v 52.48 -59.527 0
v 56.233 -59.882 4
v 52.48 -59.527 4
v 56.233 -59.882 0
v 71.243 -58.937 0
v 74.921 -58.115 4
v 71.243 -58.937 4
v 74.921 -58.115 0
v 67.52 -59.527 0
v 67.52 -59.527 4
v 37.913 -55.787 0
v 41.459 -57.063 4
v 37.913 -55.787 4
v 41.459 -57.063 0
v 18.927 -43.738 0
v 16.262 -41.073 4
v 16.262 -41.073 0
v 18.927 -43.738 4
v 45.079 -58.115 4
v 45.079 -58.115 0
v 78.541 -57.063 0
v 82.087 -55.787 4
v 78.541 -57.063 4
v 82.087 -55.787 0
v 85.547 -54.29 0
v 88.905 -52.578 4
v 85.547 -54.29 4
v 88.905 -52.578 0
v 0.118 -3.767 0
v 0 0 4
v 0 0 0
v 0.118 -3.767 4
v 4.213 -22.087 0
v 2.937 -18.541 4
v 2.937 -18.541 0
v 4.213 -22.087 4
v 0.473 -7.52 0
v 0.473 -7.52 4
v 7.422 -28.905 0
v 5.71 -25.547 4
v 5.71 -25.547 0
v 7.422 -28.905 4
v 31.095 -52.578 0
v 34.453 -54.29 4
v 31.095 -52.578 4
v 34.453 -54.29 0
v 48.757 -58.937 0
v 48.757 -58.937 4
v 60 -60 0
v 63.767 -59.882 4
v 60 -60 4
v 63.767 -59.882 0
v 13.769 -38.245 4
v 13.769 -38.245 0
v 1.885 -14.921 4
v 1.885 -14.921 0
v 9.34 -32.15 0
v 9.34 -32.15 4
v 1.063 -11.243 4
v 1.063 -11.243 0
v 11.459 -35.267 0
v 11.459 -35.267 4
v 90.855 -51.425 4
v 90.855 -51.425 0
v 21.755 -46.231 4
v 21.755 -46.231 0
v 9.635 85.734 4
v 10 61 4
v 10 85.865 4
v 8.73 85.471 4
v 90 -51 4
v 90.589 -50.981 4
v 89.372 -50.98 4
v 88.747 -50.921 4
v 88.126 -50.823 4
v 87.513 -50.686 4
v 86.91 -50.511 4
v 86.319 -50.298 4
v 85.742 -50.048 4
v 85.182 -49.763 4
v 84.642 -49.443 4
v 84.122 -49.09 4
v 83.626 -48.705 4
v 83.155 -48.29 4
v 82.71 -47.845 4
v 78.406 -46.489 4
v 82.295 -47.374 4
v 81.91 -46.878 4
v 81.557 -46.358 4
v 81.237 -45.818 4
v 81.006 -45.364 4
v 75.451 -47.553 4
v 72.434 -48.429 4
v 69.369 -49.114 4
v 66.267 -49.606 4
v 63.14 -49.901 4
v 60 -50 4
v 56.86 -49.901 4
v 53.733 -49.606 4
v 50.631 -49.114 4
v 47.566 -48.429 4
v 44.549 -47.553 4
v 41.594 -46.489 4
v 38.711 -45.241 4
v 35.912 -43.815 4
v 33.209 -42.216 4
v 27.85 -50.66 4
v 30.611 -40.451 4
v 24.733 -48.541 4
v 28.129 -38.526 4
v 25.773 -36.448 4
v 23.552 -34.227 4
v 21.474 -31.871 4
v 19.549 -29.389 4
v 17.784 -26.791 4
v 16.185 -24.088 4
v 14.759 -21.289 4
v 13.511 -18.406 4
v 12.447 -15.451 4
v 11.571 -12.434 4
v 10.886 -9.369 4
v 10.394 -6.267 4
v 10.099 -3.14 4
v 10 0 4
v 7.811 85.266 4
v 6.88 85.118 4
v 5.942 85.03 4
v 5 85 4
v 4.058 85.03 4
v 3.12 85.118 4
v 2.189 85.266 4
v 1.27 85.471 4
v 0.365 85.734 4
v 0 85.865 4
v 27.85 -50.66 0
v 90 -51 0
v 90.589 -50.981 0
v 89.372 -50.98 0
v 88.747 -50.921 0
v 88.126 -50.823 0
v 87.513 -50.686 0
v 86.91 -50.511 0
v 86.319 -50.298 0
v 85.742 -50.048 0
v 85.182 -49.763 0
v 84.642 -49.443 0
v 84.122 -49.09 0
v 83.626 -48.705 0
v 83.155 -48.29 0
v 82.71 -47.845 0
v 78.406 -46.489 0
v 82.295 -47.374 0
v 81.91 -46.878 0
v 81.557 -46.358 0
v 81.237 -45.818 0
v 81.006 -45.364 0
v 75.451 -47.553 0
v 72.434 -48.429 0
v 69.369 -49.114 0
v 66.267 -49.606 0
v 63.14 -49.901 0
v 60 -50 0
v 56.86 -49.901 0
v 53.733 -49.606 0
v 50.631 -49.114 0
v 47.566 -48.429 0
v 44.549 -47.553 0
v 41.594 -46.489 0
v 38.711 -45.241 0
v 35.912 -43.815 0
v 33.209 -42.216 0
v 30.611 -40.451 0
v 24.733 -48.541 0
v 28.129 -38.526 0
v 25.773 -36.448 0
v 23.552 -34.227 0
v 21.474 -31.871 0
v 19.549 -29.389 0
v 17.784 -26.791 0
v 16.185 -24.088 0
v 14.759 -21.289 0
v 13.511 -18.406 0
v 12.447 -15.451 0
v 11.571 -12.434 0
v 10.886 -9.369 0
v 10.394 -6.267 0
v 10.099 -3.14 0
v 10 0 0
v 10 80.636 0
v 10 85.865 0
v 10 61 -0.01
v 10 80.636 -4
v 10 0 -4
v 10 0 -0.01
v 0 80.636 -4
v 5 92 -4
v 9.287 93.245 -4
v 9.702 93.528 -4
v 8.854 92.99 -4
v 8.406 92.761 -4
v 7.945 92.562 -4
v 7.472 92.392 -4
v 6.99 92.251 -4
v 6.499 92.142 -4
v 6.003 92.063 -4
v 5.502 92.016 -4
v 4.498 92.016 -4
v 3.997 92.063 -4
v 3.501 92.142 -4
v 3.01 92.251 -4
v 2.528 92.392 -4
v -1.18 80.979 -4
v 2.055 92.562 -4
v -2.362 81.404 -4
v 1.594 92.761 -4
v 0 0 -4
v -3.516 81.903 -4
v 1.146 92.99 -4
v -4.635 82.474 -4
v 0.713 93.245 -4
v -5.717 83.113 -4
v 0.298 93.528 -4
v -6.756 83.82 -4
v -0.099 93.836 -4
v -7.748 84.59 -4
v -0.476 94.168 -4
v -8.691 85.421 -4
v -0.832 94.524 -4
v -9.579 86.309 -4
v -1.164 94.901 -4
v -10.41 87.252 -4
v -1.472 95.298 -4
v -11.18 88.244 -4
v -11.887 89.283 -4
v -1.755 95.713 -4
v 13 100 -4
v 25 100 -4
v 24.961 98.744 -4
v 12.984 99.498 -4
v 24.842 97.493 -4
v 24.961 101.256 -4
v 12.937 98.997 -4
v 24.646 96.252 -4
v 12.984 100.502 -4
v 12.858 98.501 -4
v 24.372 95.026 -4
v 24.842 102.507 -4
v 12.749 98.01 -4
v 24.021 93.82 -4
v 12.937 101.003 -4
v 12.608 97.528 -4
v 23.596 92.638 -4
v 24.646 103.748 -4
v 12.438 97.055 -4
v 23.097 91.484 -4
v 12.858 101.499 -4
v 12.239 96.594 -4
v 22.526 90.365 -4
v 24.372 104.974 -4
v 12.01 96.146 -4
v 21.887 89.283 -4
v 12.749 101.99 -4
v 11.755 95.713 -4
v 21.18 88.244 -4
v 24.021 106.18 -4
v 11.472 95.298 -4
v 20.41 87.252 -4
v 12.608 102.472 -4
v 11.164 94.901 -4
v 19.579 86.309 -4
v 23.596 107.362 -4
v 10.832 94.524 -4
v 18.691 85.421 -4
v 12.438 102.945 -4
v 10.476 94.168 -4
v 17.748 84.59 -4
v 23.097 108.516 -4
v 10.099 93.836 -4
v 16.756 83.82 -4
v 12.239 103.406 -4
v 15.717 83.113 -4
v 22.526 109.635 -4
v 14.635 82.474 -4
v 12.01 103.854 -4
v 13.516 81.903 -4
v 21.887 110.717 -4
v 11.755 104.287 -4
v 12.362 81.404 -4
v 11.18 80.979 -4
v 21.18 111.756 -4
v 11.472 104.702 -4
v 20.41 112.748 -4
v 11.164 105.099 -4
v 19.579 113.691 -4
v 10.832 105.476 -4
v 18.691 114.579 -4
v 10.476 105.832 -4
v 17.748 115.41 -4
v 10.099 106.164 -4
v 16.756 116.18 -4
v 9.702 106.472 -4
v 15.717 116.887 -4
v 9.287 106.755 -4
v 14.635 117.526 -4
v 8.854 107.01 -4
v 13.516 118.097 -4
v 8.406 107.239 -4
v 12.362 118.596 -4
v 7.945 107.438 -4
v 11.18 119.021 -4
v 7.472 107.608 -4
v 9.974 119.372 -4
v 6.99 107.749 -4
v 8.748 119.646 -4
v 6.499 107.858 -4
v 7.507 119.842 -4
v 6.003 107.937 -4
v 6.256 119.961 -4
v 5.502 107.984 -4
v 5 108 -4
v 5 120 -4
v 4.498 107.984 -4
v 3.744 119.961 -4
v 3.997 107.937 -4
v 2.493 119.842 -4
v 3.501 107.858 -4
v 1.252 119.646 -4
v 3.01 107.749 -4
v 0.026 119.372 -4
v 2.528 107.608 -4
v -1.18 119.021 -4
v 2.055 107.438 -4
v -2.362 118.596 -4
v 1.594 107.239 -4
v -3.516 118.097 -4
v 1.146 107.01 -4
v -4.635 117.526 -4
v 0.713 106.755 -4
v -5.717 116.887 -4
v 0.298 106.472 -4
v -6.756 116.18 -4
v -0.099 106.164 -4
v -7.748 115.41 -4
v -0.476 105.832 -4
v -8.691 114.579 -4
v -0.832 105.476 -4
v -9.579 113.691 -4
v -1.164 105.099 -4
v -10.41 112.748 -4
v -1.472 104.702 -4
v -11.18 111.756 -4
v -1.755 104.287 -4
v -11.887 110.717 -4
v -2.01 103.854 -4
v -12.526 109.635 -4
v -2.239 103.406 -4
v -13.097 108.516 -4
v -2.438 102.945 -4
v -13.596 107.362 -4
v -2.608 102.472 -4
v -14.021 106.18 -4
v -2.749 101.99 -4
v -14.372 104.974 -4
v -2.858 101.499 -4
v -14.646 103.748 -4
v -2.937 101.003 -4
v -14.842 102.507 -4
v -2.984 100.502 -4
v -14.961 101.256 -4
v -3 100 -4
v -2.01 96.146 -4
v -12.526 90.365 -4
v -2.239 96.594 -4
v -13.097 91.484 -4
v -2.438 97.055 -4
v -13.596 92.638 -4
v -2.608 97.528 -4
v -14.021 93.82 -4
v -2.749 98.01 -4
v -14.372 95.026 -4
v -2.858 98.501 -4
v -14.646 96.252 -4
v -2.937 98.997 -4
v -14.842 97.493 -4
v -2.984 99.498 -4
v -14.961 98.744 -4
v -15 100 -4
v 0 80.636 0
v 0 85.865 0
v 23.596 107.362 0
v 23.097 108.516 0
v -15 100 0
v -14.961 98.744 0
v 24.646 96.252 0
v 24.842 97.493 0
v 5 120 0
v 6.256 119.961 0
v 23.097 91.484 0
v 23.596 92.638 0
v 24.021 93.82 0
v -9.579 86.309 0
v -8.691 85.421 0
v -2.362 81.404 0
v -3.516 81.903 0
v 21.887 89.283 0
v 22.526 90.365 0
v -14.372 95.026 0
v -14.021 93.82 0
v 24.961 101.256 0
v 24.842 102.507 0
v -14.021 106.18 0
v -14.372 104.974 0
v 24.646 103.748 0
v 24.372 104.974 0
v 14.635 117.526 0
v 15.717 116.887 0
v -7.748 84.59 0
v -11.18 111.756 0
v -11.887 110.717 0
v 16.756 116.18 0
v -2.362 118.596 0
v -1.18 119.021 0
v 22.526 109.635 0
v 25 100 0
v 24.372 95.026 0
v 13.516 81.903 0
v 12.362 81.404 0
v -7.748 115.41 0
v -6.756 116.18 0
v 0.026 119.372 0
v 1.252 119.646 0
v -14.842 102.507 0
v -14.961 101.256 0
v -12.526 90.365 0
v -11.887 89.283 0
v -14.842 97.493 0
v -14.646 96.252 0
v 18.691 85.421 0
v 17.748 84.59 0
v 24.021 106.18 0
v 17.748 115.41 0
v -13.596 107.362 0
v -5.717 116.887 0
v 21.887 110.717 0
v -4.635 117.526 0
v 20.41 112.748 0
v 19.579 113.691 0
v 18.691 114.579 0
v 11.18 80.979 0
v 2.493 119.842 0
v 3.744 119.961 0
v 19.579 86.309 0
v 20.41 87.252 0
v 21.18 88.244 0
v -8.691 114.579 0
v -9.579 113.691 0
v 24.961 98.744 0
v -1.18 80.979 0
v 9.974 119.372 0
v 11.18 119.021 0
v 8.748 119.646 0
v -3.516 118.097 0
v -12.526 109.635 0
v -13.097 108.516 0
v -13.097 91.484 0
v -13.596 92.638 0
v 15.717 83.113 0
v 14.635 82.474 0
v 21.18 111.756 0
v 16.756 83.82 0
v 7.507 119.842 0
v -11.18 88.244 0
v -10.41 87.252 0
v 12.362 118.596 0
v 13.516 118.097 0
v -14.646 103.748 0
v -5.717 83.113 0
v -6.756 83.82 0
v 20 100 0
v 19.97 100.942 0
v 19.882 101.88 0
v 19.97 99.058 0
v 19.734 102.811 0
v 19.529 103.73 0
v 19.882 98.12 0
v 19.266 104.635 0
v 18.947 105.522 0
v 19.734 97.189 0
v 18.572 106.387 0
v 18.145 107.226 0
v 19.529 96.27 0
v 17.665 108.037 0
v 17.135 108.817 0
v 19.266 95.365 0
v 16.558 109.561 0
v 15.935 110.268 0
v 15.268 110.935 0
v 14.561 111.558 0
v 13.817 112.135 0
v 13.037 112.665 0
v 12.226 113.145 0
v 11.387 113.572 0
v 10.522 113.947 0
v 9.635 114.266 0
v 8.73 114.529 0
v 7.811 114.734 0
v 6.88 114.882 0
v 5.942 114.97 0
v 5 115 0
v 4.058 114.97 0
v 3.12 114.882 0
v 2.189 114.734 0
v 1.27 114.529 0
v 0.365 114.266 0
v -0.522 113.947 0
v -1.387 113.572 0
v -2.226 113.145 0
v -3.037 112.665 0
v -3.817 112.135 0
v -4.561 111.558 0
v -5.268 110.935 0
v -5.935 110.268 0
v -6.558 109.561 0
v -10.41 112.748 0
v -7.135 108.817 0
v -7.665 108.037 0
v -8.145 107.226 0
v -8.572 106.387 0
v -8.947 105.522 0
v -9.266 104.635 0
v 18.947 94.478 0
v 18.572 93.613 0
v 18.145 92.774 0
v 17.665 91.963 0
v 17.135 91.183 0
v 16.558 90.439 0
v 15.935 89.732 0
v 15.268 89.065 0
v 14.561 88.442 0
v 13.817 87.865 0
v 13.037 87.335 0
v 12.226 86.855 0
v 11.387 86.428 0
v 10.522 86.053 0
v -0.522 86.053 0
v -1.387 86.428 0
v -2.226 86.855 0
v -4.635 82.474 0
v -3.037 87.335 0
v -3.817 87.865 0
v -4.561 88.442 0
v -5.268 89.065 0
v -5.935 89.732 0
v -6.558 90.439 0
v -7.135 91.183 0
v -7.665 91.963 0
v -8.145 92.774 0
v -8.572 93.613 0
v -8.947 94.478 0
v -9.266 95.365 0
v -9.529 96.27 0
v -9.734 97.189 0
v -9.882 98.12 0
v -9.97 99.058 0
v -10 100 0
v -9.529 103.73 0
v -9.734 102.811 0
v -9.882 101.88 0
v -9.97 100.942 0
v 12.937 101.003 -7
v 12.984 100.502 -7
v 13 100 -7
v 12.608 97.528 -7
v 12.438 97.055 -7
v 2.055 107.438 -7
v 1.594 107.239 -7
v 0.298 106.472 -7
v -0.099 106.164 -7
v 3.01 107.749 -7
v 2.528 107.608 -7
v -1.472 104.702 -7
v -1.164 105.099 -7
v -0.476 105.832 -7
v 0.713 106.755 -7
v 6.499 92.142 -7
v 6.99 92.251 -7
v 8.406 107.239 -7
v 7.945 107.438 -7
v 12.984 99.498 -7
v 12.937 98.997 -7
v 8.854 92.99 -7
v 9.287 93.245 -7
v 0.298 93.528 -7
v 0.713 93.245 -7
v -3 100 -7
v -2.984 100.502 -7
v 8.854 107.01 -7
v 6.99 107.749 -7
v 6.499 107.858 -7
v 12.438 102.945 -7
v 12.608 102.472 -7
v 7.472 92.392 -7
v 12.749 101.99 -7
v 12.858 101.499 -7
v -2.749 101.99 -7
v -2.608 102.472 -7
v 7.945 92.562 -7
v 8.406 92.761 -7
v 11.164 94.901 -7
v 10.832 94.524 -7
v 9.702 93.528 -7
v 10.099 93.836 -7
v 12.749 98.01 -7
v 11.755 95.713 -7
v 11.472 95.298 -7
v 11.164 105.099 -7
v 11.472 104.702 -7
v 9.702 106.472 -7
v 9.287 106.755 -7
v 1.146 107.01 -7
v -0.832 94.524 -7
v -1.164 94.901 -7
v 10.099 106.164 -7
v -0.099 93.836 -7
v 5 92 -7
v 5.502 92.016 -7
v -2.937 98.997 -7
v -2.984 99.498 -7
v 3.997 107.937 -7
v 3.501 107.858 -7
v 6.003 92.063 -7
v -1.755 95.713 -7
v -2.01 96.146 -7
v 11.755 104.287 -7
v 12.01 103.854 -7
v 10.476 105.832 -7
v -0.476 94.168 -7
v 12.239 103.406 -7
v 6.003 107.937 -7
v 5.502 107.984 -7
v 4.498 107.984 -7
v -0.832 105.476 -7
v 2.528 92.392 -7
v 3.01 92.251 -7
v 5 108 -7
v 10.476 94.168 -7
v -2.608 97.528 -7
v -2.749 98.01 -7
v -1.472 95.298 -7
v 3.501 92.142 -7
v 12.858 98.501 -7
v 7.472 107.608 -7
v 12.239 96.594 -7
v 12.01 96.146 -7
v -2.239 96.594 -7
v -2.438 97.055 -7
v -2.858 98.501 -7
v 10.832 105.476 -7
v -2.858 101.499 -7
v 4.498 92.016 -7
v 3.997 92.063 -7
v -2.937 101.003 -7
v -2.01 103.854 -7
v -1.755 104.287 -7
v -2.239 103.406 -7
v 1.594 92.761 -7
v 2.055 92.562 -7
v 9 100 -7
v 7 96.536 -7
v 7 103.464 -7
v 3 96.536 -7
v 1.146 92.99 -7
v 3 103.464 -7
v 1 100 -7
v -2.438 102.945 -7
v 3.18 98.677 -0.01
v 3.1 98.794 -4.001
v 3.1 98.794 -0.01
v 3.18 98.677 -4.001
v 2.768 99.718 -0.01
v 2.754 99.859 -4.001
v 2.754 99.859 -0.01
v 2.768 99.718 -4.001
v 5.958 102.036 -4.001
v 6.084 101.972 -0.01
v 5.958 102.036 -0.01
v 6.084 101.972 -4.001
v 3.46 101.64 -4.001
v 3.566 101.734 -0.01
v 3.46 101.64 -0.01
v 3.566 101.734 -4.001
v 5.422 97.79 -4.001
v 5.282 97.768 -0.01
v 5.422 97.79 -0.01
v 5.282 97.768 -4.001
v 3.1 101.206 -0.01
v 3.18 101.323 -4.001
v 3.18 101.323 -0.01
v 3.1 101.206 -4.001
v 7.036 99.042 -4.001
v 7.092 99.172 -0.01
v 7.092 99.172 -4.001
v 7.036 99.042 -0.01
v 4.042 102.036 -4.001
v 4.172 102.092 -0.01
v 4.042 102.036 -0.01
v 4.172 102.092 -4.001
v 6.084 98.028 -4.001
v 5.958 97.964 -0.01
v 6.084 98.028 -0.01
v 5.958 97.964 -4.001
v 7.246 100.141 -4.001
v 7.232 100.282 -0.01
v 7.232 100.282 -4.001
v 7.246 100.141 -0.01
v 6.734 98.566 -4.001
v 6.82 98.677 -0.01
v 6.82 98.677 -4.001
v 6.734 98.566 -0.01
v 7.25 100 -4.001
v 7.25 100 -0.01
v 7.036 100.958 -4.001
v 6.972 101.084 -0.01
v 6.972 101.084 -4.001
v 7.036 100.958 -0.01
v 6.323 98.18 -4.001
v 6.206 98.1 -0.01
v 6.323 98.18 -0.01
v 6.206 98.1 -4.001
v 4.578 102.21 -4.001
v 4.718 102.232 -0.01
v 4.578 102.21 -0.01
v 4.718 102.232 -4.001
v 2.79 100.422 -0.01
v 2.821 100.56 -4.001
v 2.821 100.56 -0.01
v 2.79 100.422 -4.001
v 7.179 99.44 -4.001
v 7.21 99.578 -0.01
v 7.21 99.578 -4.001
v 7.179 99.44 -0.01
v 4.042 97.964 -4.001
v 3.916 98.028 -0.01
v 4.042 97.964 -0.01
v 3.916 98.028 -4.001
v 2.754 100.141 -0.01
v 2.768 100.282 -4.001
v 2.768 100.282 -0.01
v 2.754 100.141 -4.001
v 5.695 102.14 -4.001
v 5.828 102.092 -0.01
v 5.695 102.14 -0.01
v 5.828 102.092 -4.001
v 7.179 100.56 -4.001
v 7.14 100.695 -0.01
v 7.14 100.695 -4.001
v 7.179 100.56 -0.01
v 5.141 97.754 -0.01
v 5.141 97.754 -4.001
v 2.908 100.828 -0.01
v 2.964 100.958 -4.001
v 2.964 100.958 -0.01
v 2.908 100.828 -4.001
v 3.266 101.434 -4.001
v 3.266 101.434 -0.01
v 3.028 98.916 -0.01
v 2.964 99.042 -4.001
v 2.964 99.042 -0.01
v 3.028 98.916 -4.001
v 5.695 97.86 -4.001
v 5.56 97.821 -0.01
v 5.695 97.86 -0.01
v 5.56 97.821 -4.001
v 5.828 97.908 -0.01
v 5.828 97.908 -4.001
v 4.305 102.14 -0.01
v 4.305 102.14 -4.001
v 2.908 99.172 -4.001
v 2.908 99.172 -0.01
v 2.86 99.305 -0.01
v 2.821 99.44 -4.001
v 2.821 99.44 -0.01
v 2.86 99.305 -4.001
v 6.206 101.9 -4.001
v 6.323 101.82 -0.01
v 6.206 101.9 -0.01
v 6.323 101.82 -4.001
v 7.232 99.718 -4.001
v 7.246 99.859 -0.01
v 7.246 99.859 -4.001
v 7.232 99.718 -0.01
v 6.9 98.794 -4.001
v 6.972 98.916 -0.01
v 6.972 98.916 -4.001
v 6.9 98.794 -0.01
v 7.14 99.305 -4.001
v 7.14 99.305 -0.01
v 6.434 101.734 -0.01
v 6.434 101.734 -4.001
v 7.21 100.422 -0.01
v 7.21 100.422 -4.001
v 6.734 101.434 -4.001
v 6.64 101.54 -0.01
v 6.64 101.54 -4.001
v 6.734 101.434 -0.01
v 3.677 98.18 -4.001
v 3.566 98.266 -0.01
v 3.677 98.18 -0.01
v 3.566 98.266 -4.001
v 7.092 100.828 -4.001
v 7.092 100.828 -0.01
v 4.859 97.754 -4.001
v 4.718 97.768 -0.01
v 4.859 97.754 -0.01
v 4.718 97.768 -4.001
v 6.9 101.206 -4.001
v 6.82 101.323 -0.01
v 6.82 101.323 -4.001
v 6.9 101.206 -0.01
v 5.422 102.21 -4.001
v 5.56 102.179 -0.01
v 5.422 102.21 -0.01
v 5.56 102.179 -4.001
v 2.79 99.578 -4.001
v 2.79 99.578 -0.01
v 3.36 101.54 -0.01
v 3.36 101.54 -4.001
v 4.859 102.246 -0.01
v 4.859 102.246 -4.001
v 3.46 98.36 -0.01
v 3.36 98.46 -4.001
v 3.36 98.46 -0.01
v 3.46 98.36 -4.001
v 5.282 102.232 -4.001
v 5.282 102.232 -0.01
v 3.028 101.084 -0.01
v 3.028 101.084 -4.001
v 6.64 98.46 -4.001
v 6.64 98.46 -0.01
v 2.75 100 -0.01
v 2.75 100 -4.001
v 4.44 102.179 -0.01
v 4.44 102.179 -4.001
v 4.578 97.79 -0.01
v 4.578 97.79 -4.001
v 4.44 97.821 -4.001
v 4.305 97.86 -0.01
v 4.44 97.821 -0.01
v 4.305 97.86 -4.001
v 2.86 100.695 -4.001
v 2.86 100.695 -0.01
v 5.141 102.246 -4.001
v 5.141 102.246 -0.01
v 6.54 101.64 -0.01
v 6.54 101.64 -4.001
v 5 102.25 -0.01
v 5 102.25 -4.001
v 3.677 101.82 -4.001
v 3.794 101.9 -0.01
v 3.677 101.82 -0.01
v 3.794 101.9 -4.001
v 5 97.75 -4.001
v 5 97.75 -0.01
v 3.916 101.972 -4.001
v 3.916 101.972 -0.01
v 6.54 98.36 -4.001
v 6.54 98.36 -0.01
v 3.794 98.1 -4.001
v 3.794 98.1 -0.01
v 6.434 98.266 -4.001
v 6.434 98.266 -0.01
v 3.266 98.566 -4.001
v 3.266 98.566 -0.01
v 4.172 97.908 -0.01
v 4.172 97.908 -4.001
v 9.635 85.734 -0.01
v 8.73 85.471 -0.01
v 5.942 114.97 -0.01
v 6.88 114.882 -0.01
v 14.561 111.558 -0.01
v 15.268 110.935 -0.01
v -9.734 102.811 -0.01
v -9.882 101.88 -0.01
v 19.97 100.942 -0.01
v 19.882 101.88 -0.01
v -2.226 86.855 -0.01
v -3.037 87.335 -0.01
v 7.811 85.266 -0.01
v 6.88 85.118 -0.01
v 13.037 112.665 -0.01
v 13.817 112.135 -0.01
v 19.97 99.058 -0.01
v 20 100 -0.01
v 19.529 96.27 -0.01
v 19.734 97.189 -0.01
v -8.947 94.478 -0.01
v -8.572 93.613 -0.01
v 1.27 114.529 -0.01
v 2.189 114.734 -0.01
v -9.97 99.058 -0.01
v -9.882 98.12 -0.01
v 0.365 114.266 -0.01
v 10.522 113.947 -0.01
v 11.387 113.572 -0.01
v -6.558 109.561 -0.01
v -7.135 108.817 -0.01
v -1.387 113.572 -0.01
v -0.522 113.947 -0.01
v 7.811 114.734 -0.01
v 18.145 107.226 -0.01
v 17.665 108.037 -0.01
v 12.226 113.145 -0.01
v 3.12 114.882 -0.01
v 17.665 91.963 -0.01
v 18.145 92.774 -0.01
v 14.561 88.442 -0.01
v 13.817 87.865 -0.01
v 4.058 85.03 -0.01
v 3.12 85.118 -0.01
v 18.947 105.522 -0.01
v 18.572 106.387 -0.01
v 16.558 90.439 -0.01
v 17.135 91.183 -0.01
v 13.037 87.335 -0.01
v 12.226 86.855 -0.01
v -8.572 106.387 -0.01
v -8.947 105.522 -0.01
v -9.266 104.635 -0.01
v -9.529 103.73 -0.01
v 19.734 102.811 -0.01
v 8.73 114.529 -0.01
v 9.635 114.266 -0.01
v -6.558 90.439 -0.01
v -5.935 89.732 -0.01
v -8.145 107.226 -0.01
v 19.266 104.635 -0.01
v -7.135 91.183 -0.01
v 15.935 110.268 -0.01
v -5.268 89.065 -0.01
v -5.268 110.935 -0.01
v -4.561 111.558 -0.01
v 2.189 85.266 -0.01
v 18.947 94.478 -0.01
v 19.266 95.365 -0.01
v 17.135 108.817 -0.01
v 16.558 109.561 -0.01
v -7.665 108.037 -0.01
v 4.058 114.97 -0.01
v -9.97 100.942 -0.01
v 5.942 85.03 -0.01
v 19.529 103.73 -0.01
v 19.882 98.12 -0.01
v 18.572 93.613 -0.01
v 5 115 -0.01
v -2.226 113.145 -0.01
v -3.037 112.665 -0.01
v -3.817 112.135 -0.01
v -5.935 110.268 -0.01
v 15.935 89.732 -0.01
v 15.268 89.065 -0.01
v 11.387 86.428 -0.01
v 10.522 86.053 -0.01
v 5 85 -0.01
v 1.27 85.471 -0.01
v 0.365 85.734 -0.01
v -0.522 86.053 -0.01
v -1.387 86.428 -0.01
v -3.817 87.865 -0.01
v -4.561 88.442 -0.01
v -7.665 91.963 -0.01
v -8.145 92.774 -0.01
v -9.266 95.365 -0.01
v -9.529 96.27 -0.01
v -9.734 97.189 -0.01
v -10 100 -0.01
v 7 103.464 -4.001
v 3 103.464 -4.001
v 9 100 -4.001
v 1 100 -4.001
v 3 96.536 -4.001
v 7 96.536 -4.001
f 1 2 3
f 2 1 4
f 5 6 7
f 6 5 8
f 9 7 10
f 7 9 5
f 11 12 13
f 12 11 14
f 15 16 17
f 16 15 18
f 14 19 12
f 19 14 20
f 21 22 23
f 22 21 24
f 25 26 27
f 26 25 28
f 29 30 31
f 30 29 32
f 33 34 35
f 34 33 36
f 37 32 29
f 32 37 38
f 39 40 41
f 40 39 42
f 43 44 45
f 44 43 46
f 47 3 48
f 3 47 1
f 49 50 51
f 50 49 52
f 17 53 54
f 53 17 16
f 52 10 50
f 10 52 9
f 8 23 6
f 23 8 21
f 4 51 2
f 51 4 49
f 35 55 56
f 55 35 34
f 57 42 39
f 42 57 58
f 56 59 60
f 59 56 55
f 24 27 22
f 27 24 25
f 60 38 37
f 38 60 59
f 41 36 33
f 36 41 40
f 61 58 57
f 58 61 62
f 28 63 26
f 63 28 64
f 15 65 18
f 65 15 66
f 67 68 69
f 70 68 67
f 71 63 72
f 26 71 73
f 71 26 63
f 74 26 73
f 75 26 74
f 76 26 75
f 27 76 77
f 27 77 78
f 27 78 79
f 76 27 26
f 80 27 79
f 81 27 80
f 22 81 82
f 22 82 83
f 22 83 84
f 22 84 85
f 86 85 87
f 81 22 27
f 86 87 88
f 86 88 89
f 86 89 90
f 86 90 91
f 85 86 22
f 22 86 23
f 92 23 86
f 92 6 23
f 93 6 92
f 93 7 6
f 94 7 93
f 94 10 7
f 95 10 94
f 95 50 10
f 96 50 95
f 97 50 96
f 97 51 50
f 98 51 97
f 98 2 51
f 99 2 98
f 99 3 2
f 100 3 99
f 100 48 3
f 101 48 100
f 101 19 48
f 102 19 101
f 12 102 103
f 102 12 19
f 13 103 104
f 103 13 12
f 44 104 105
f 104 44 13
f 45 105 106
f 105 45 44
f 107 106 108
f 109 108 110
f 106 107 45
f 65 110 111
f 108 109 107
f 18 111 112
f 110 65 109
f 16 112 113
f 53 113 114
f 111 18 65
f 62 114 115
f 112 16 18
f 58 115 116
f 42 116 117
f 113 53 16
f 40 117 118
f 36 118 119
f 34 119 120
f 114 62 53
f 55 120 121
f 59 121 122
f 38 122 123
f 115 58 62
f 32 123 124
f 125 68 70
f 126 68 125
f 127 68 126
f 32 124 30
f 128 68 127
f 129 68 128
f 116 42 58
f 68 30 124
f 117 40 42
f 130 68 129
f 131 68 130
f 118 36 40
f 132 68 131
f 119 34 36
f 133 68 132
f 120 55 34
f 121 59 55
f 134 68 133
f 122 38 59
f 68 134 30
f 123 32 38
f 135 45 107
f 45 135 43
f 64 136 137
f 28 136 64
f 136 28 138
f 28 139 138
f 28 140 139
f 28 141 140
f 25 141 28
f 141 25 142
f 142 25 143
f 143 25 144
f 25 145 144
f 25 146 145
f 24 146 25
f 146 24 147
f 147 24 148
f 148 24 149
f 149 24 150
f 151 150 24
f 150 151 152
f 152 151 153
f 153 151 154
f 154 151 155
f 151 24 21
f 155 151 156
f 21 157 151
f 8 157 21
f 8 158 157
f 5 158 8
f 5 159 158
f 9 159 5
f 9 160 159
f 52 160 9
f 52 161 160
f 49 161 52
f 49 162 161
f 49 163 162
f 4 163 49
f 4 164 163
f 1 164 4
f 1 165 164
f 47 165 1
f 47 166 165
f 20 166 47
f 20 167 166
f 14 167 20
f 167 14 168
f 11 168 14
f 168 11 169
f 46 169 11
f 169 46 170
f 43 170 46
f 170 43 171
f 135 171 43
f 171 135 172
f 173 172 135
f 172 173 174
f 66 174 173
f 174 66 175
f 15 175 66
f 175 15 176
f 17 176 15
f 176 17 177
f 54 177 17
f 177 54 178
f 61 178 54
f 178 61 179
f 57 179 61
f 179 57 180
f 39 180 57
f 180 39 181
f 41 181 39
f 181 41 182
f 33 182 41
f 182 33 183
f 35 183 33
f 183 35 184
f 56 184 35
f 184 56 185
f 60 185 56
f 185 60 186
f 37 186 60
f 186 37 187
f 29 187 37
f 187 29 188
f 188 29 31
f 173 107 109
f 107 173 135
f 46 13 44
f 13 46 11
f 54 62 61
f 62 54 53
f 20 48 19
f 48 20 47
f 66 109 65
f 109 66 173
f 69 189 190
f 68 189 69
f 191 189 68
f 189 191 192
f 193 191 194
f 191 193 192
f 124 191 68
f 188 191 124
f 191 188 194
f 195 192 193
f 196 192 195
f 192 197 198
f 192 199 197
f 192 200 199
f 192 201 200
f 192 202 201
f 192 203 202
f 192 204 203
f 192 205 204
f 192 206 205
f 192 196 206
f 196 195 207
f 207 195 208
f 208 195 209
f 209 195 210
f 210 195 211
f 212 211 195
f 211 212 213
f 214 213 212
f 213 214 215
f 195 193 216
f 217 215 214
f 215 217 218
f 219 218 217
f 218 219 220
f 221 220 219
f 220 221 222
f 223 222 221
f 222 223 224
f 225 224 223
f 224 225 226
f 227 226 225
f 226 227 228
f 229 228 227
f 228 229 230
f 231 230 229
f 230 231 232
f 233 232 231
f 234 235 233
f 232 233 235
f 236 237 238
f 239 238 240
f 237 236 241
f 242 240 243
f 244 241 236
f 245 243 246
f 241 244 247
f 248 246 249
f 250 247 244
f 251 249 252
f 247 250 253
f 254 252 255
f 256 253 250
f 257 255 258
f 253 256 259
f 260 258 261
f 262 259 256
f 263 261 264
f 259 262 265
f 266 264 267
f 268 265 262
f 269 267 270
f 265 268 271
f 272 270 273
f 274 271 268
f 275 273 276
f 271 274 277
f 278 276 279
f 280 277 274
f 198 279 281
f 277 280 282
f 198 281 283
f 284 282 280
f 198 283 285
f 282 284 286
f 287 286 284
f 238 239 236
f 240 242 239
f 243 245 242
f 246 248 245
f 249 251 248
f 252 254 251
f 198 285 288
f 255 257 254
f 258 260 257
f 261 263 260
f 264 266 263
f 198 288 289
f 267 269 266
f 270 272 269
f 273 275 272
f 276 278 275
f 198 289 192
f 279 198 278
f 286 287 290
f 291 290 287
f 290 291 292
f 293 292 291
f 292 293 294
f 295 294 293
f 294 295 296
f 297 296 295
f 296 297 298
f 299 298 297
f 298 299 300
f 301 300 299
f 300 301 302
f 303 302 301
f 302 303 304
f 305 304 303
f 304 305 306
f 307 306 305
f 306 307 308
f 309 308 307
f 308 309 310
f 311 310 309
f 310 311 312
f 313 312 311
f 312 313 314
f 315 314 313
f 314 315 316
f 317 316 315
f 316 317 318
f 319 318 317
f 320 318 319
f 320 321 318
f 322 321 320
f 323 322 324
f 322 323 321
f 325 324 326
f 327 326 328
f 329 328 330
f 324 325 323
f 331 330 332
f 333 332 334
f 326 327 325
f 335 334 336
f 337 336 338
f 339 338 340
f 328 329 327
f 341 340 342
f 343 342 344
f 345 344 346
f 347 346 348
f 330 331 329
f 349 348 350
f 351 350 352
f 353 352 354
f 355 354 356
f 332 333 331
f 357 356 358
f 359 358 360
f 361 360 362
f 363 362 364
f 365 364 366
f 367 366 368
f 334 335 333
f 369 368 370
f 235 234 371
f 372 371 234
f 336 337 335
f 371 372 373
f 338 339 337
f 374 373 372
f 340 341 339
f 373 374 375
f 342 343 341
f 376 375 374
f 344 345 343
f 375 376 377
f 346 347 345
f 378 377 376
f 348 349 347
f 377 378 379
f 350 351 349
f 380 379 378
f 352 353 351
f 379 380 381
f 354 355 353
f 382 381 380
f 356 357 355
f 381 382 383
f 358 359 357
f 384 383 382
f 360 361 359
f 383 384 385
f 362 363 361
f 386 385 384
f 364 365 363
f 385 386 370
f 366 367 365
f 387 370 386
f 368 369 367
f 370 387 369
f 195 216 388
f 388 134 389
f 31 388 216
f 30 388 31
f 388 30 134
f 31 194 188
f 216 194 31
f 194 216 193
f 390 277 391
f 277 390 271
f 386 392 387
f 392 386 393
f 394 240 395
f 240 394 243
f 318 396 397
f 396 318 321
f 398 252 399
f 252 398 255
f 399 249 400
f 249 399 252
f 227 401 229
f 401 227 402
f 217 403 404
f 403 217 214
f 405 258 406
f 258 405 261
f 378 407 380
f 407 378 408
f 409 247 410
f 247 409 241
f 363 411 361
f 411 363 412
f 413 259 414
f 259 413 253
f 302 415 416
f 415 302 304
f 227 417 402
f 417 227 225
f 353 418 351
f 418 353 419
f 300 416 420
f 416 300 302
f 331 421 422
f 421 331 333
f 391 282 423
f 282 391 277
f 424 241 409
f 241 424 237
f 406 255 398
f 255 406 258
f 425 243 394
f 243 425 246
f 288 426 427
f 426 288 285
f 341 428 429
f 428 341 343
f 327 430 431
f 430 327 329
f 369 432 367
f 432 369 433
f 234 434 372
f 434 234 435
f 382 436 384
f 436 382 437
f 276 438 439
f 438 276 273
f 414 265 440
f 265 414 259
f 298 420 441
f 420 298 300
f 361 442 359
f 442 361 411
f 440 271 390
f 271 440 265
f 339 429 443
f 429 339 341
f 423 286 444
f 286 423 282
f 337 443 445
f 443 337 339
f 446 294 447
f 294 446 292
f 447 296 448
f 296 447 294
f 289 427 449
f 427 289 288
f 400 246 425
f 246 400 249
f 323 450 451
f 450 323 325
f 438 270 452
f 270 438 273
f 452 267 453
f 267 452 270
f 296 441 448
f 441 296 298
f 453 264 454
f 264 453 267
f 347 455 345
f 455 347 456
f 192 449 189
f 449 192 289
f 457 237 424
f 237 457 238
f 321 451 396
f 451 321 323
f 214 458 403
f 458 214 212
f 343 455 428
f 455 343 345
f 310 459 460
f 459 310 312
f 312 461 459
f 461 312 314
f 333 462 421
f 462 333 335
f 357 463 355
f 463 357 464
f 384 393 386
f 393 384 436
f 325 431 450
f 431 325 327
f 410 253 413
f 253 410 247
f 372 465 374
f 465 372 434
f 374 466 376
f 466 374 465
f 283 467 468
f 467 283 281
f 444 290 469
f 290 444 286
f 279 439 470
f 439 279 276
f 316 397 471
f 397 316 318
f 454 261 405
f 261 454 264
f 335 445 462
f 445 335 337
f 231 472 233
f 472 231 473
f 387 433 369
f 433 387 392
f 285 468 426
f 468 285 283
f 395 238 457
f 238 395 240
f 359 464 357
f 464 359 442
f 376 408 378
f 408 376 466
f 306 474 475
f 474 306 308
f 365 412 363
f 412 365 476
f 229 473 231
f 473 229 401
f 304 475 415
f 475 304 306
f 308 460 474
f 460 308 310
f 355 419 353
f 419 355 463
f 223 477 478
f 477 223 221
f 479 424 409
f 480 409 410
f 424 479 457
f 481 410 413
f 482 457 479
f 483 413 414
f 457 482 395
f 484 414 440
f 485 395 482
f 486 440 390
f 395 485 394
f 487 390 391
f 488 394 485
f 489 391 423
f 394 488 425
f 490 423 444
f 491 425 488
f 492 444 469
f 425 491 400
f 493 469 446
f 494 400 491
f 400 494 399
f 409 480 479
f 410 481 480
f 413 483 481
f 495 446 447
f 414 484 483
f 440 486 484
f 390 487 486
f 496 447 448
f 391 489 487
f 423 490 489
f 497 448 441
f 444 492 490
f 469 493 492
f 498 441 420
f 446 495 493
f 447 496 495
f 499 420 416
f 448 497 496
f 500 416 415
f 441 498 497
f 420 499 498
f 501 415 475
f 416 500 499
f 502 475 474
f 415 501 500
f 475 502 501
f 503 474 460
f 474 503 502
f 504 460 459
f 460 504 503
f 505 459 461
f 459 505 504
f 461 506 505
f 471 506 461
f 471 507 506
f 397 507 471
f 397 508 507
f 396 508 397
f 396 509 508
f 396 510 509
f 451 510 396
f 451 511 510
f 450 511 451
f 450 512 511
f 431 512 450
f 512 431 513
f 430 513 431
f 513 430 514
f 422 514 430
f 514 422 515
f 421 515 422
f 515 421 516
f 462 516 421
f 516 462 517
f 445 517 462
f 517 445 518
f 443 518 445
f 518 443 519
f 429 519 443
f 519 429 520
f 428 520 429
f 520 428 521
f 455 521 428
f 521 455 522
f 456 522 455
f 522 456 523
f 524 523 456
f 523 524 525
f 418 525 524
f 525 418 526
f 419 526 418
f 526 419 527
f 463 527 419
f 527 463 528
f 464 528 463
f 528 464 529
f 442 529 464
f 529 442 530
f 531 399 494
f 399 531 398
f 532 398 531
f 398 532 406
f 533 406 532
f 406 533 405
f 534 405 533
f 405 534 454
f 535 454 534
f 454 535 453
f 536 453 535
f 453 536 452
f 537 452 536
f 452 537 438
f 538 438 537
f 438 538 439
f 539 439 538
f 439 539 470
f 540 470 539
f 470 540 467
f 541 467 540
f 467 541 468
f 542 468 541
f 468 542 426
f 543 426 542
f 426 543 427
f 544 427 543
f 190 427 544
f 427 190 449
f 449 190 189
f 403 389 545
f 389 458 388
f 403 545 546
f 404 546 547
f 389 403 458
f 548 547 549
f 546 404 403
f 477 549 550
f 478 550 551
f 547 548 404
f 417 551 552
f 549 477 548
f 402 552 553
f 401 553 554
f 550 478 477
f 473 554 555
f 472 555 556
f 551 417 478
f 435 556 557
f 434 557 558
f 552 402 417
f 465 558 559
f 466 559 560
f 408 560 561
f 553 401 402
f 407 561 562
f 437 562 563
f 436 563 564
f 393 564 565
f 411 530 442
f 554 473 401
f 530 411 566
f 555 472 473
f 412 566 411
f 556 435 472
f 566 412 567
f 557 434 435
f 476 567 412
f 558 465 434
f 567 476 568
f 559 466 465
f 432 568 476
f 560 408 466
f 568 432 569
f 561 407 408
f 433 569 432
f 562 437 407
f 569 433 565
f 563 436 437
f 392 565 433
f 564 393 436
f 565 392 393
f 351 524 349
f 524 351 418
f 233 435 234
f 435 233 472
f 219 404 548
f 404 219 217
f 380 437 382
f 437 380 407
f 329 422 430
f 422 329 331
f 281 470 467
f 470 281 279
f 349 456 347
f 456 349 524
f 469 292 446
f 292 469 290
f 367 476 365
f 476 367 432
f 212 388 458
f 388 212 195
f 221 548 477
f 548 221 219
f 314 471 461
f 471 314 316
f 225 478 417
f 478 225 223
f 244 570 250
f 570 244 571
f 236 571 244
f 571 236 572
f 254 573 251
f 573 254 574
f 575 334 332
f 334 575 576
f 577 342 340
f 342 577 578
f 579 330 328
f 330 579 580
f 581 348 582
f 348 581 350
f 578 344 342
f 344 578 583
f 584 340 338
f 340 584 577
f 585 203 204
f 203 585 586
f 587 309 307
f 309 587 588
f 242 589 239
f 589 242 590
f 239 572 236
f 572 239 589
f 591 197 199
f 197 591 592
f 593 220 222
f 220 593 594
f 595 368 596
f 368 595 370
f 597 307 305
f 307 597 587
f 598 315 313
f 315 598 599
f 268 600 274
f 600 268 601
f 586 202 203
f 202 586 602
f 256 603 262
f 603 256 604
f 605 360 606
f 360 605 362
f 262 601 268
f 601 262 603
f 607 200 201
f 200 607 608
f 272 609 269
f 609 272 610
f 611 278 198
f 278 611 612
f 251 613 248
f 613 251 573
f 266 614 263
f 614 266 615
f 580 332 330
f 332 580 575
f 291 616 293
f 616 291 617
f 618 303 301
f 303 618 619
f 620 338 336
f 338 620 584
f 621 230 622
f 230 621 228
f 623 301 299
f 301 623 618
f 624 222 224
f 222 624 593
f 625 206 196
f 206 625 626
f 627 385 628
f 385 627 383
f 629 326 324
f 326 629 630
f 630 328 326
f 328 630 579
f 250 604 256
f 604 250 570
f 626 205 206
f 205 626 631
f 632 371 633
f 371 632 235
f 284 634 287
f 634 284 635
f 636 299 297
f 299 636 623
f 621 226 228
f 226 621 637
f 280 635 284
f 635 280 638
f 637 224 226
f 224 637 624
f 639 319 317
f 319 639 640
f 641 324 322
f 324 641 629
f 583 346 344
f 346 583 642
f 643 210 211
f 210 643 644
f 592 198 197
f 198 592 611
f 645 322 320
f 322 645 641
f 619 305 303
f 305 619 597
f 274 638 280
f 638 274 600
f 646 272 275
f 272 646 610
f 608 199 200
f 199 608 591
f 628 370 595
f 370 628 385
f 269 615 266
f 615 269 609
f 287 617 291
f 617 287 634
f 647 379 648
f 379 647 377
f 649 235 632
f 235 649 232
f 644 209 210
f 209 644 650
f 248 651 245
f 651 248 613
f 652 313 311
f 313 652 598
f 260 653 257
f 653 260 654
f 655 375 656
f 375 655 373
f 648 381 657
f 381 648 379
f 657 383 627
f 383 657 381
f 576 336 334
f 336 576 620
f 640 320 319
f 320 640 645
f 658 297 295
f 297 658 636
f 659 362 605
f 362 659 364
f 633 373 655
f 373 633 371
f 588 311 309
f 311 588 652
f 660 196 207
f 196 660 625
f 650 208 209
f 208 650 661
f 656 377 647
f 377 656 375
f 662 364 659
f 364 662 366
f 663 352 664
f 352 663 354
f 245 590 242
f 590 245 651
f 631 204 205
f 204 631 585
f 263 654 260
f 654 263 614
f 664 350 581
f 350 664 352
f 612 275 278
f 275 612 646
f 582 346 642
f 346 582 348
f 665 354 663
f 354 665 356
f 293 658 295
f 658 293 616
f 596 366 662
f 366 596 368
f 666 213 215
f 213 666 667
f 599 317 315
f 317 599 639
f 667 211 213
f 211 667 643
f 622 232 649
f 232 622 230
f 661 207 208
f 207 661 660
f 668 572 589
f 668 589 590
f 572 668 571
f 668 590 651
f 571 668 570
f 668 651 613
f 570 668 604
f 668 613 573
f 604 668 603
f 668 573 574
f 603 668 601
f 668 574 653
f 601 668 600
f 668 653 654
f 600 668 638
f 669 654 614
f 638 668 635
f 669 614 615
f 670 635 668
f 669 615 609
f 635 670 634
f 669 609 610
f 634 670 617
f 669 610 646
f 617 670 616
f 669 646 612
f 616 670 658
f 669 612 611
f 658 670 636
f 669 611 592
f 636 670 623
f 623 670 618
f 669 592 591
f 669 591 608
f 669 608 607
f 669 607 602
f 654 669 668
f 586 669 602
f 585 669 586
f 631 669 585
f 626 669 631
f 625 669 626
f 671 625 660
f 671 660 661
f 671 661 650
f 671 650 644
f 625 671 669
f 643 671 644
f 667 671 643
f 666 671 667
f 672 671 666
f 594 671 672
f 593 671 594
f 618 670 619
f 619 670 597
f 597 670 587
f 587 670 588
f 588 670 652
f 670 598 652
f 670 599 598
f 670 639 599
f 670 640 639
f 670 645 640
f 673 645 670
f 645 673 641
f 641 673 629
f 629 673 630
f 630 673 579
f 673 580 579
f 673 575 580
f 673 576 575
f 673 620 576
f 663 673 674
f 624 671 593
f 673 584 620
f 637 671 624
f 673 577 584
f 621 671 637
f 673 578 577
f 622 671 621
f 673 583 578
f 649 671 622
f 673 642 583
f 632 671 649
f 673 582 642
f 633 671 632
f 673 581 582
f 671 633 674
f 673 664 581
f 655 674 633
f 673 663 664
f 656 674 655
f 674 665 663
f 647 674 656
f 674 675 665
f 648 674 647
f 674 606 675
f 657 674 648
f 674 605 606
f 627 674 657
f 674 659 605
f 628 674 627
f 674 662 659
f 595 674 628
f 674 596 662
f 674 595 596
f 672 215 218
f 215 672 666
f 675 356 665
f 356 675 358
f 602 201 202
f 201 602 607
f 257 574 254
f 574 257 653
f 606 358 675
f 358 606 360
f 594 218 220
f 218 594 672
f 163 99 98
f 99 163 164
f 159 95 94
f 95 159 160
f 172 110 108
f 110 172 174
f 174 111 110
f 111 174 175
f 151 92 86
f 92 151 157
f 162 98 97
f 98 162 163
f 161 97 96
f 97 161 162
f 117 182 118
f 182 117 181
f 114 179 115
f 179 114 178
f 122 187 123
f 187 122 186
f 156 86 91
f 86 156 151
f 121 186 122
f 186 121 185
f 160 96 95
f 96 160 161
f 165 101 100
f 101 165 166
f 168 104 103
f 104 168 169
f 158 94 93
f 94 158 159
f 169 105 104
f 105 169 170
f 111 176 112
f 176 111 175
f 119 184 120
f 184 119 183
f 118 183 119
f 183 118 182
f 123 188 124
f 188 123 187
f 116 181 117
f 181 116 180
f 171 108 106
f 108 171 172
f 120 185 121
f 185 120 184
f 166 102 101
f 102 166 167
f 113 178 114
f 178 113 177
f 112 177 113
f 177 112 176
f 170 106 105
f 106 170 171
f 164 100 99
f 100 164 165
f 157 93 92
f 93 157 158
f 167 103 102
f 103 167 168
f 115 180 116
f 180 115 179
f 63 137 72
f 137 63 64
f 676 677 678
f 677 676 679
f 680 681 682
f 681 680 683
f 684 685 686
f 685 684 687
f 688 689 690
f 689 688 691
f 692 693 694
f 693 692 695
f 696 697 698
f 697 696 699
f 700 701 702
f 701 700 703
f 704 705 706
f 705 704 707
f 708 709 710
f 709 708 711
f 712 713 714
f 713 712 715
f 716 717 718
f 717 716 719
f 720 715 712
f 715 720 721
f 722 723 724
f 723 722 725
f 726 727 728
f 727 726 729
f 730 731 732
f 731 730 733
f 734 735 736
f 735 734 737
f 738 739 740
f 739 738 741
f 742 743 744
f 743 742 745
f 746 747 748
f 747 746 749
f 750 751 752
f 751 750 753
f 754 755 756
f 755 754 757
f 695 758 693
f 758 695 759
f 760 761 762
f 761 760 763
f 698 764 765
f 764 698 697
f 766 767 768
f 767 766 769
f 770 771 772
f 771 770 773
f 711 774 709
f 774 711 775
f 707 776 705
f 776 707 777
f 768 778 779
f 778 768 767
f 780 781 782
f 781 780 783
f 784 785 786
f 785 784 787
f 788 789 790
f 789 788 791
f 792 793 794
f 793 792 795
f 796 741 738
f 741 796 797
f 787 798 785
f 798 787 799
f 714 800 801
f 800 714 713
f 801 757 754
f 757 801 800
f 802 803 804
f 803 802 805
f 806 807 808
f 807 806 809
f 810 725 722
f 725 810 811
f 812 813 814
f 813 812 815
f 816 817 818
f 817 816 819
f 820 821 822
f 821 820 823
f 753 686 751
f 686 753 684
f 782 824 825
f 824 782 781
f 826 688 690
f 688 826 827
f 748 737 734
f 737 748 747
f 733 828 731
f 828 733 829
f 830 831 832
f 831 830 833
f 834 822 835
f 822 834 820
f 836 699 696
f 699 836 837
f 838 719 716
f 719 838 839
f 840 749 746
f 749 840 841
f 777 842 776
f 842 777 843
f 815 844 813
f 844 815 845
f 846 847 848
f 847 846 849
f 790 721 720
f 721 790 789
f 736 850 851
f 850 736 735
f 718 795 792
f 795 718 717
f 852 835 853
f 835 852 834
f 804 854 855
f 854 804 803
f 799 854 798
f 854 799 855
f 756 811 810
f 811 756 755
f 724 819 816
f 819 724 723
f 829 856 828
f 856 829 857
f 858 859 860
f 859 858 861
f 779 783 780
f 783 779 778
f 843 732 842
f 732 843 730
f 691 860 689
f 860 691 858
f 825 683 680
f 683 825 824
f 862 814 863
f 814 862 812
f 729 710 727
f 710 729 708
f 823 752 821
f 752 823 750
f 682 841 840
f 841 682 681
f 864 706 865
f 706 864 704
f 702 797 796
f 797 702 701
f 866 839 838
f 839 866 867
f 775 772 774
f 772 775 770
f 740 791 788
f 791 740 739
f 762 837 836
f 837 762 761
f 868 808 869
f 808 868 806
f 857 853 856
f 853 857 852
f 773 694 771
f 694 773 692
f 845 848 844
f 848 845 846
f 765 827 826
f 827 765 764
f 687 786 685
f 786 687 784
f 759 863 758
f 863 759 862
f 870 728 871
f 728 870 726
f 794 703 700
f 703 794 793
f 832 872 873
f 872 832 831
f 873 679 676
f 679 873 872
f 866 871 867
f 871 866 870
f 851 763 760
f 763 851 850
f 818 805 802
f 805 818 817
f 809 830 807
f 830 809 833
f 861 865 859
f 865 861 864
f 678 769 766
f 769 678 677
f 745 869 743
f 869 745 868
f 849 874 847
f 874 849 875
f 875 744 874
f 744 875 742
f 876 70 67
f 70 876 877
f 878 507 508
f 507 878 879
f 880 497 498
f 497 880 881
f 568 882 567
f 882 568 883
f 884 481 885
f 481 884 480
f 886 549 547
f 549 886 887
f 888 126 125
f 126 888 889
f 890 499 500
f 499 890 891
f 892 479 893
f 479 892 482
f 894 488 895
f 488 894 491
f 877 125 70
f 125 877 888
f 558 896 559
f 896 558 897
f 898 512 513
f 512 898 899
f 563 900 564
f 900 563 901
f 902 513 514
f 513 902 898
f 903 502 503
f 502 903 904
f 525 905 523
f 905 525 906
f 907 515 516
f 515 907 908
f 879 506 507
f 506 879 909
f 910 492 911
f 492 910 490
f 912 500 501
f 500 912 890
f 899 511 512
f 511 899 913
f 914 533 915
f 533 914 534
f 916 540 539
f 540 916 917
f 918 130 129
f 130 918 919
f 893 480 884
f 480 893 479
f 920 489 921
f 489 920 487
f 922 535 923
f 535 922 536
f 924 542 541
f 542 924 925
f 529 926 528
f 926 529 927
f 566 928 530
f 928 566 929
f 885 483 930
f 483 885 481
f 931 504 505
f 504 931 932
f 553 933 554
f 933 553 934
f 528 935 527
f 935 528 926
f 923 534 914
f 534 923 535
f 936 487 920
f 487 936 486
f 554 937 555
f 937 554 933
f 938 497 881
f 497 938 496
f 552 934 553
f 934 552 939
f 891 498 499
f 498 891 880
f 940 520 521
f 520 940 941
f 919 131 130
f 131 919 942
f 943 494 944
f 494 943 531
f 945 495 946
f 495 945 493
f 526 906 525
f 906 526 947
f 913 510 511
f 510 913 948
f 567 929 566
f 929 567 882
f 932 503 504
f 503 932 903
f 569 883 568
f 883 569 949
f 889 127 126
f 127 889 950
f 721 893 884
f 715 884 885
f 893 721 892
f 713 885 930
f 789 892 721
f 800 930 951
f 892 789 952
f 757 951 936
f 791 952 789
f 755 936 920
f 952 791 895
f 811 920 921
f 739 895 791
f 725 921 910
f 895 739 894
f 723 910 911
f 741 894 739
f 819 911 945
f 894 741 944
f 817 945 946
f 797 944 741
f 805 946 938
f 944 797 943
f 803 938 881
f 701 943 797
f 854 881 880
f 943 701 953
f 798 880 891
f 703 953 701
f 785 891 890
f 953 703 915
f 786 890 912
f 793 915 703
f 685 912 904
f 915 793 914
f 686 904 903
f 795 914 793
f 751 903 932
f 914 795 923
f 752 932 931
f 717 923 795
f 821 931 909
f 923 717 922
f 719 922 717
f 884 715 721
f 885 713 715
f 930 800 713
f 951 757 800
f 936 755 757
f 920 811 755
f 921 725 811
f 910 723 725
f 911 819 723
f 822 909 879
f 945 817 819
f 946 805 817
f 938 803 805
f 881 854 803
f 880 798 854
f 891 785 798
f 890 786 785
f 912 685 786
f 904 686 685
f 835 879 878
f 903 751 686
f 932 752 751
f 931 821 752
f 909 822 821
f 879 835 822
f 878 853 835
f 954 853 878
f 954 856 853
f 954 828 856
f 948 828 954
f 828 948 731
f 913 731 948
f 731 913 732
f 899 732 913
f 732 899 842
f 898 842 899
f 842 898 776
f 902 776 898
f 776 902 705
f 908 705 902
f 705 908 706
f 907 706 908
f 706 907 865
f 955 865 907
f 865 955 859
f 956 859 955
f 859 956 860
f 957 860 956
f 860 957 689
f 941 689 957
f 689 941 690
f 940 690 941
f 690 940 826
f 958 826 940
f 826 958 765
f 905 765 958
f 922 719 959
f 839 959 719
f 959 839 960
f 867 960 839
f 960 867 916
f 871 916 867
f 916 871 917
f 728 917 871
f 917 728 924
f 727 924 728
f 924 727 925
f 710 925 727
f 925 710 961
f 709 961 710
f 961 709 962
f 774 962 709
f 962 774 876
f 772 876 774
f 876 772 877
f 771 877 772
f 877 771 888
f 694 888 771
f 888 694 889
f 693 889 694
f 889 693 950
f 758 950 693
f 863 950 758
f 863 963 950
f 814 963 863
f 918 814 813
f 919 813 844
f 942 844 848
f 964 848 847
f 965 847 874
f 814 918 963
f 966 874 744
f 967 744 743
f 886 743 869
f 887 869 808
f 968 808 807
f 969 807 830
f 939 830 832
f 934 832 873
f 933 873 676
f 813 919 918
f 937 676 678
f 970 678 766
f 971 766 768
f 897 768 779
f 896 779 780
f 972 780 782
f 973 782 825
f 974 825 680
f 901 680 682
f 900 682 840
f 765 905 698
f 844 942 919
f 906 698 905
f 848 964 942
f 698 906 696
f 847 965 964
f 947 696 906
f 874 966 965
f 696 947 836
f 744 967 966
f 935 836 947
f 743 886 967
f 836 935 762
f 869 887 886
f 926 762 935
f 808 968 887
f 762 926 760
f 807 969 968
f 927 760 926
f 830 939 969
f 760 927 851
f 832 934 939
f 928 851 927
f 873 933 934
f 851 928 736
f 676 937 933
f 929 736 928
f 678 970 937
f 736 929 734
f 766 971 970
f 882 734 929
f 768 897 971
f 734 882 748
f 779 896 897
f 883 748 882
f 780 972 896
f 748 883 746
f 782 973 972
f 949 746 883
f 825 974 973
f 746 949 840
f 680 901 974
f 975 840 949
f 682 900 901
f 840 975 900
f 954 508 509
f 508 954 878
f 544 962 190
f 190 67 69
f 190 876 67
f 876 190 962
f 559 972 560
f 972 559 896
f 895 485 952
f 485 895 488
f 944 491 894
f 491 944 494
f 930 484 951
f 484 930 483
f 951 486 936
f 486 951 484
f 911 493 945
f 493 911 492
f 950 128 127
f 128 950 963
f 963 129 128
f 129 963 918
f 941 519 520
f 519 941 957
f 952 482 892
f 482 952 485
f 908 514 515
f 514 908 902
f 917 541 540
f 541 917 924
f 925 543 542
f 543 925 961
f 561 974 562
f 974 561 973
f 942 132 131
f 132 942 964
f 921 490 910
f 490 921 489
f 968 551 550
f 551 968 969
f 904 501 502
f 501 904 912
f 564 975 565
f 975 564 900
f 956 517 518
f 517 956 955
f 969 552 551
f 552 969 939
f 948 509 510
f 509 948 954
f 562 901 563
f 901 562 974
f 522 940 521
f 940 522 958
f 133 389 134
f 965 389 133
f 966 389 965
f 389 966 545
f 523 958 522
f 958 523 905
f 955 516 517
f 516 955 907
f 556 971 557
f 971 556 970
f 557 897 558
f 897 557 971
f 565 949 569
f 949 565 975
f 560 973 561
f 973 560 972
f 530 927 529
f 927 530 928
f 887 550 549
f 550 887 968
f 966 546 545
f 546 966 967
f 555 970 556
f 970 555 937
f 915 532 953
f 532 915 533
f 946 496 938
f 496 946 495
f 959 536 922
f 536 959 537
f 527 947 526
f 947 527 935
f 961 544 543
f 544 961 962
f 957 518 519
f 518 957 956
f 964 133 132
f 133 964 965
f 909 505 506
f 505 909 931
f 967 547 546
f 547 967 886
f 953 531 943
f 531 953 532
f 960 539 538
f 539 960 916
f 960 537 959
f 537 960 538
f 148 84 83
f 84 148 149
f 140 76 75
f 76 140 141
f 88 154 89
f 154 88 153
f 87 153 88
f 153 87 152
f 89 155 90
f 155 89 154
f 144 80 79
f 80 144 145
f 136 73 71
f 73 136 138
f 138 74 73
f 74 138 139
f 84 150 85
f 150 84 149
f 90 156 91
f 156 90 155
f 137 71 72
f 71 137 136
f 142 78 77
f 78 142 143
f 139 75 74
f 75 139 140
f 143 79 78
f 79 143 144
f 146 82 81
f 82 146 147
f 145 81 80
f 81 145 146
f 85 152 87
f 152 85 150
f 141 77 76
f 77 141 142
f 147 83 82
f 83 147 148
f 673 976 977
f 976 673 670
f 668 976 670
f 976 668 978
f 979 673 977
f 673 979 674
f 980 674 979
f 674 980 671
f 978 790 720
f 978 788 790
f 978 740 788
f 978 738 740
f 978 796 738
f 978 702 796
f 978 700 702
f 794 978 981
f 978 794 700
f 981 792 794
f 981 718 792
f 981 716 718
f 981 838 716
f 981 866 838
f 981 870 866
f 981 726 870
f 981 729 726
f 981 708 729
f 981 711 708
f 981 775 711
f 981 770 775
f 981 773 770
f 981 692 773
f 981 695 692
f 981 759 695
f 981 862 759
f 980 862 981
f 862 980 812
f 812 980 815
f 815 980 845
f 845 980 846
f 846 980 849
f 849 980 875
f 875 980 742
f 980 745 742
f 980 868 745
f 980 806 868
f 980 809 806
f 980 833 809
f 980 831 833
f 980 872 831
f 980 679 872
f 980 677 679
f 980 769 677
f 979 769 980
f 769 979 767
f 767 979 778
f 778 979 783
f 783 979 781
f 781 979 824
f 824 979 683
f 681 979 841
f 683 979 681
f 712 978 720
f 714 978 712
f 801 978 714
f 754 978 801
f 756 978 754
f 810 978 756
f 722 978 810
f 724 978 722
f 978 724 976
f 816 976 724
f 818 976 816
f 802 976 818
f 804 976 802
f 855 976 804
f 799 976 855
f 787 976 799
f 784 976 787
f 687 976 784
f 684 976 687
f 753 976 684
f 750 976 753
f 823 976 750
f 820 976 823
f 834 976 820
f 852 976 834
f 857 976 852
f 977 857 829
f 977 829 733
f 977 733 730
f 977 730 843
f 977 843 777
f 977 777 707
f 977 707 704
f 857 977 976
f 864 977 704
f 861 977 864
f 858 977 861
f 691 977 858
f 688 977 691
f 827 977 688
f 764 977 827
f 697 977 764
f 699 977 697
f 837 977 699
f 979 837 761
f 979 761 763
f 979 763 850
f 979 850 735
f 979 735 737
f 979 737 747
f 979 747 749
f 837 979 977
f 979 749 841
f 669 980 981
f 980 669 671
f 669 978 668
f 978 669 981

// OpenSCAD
module left() {
    difference() {
        union(){
                translate([60, 0, 0]) cylinder(r = 60, h = 4, center = false, $fn = 100);
                cube([10, 100, 4]);
                translate([5, 100, 0]) cylinder(r = 10, h = 4, center = false, $fn = 100);
        } 
        translate([60, 0, -0.01]) cylinder(r = 60 - 10, h = 4 + 0.02, center = false, $fn = 100);
        translate([10, 0, -0.01]) cube([2*60 + 1, 60 + 1, 4 + 0.02]);
        translate([60, 0, -0.01]) rotate([0,0,-atan(100/60)]) cube([120, 120, 4 + 0.02]);
        translate([5, 100, -0.01]) cylinder(d = 4 + 0.5, h = 4 + 0.02, center = false, $fn = 100);
        translate([90, -41, -0.01]) cylinder(r = 10, h = 4 + 0.02, center = false, $fn = 100);
    }
}

module right() {
    difference() {
        union(){
                translate([60, 0, 0]) cylinder(r = 60, h = 4, center = false, $fn = 100);
                translate([0, 0, -4]) cube([10, 100, 8]);
                translate([5, 100, -4]) cylinder(r = 20, h = 4, center = false, $fn = 100);
                translate([5, 100, -7]) cylinder(r = 8, h = 3, center = false, $fn = 100);
        } 
        translate([60, 0, -0.01]) cylinder(r = 60 - 10, h = 4 + 0.02, center = false, $fn = 100);
        translate([10, 0, -0.01]) cube([2*60 + 1, 60 + 1, 4 + 0.02]);
        translate([60, 0, -0.01]) rotate([0,0,-atan(100/60)]) cube([120, 120, 4 + 0.02]);
        translate([5, 100, -4 -0.01]) cylinder(d = 4 + 0.5, h = 4 + 0.02, center = false, $fn = 100);
        translate([5, 100, -0.01]) cylinder(r = 15, h = 4 + 0.02, center = false, $fn = 100);
        translate([90, -41, -0.01]) cylinder(r = 10, h = 4 + 0.02, center = false, $fn = 100);
        translate([5, 100, -7 - 0.001]) cylinder(r = 4, h = 3, center = false, $fn = 6);
    }
}

module left1() {
    difference() {
        union(){
                translate([60, 0, 0]) cylinder(r = 60, h = 4, center = false, $fn = 100);
                cube([10, 150, 4]);
                translate([5, 150, 0]) cylinder(r = 10, h = 4, center = false, $fn = 100);
        } 
        translate([60, 0, -0.01]) cylinder(r = 60 - 10, h = 4 + 0.02, center = false, $fn = 100);
        translate([10, 0, -0.01]) cube([2*60 + 1, 60 + 1, 4 + 0.02]);
        translate([60, 0, -0.01]) rotate([0,0,-atan(150/60)]) cube([120, 120, 4 + 0.02]);
        translate([5, 150, -0.01]) cylinder(d = 4 + 0.1, h = 4 + 0.02, center = false, $fn = 100);
        translate([80, -45, -0.01]) cylinder(r = 10, h = 4 + 0.02, center = false, $fn = 100);
    }
}

right();
